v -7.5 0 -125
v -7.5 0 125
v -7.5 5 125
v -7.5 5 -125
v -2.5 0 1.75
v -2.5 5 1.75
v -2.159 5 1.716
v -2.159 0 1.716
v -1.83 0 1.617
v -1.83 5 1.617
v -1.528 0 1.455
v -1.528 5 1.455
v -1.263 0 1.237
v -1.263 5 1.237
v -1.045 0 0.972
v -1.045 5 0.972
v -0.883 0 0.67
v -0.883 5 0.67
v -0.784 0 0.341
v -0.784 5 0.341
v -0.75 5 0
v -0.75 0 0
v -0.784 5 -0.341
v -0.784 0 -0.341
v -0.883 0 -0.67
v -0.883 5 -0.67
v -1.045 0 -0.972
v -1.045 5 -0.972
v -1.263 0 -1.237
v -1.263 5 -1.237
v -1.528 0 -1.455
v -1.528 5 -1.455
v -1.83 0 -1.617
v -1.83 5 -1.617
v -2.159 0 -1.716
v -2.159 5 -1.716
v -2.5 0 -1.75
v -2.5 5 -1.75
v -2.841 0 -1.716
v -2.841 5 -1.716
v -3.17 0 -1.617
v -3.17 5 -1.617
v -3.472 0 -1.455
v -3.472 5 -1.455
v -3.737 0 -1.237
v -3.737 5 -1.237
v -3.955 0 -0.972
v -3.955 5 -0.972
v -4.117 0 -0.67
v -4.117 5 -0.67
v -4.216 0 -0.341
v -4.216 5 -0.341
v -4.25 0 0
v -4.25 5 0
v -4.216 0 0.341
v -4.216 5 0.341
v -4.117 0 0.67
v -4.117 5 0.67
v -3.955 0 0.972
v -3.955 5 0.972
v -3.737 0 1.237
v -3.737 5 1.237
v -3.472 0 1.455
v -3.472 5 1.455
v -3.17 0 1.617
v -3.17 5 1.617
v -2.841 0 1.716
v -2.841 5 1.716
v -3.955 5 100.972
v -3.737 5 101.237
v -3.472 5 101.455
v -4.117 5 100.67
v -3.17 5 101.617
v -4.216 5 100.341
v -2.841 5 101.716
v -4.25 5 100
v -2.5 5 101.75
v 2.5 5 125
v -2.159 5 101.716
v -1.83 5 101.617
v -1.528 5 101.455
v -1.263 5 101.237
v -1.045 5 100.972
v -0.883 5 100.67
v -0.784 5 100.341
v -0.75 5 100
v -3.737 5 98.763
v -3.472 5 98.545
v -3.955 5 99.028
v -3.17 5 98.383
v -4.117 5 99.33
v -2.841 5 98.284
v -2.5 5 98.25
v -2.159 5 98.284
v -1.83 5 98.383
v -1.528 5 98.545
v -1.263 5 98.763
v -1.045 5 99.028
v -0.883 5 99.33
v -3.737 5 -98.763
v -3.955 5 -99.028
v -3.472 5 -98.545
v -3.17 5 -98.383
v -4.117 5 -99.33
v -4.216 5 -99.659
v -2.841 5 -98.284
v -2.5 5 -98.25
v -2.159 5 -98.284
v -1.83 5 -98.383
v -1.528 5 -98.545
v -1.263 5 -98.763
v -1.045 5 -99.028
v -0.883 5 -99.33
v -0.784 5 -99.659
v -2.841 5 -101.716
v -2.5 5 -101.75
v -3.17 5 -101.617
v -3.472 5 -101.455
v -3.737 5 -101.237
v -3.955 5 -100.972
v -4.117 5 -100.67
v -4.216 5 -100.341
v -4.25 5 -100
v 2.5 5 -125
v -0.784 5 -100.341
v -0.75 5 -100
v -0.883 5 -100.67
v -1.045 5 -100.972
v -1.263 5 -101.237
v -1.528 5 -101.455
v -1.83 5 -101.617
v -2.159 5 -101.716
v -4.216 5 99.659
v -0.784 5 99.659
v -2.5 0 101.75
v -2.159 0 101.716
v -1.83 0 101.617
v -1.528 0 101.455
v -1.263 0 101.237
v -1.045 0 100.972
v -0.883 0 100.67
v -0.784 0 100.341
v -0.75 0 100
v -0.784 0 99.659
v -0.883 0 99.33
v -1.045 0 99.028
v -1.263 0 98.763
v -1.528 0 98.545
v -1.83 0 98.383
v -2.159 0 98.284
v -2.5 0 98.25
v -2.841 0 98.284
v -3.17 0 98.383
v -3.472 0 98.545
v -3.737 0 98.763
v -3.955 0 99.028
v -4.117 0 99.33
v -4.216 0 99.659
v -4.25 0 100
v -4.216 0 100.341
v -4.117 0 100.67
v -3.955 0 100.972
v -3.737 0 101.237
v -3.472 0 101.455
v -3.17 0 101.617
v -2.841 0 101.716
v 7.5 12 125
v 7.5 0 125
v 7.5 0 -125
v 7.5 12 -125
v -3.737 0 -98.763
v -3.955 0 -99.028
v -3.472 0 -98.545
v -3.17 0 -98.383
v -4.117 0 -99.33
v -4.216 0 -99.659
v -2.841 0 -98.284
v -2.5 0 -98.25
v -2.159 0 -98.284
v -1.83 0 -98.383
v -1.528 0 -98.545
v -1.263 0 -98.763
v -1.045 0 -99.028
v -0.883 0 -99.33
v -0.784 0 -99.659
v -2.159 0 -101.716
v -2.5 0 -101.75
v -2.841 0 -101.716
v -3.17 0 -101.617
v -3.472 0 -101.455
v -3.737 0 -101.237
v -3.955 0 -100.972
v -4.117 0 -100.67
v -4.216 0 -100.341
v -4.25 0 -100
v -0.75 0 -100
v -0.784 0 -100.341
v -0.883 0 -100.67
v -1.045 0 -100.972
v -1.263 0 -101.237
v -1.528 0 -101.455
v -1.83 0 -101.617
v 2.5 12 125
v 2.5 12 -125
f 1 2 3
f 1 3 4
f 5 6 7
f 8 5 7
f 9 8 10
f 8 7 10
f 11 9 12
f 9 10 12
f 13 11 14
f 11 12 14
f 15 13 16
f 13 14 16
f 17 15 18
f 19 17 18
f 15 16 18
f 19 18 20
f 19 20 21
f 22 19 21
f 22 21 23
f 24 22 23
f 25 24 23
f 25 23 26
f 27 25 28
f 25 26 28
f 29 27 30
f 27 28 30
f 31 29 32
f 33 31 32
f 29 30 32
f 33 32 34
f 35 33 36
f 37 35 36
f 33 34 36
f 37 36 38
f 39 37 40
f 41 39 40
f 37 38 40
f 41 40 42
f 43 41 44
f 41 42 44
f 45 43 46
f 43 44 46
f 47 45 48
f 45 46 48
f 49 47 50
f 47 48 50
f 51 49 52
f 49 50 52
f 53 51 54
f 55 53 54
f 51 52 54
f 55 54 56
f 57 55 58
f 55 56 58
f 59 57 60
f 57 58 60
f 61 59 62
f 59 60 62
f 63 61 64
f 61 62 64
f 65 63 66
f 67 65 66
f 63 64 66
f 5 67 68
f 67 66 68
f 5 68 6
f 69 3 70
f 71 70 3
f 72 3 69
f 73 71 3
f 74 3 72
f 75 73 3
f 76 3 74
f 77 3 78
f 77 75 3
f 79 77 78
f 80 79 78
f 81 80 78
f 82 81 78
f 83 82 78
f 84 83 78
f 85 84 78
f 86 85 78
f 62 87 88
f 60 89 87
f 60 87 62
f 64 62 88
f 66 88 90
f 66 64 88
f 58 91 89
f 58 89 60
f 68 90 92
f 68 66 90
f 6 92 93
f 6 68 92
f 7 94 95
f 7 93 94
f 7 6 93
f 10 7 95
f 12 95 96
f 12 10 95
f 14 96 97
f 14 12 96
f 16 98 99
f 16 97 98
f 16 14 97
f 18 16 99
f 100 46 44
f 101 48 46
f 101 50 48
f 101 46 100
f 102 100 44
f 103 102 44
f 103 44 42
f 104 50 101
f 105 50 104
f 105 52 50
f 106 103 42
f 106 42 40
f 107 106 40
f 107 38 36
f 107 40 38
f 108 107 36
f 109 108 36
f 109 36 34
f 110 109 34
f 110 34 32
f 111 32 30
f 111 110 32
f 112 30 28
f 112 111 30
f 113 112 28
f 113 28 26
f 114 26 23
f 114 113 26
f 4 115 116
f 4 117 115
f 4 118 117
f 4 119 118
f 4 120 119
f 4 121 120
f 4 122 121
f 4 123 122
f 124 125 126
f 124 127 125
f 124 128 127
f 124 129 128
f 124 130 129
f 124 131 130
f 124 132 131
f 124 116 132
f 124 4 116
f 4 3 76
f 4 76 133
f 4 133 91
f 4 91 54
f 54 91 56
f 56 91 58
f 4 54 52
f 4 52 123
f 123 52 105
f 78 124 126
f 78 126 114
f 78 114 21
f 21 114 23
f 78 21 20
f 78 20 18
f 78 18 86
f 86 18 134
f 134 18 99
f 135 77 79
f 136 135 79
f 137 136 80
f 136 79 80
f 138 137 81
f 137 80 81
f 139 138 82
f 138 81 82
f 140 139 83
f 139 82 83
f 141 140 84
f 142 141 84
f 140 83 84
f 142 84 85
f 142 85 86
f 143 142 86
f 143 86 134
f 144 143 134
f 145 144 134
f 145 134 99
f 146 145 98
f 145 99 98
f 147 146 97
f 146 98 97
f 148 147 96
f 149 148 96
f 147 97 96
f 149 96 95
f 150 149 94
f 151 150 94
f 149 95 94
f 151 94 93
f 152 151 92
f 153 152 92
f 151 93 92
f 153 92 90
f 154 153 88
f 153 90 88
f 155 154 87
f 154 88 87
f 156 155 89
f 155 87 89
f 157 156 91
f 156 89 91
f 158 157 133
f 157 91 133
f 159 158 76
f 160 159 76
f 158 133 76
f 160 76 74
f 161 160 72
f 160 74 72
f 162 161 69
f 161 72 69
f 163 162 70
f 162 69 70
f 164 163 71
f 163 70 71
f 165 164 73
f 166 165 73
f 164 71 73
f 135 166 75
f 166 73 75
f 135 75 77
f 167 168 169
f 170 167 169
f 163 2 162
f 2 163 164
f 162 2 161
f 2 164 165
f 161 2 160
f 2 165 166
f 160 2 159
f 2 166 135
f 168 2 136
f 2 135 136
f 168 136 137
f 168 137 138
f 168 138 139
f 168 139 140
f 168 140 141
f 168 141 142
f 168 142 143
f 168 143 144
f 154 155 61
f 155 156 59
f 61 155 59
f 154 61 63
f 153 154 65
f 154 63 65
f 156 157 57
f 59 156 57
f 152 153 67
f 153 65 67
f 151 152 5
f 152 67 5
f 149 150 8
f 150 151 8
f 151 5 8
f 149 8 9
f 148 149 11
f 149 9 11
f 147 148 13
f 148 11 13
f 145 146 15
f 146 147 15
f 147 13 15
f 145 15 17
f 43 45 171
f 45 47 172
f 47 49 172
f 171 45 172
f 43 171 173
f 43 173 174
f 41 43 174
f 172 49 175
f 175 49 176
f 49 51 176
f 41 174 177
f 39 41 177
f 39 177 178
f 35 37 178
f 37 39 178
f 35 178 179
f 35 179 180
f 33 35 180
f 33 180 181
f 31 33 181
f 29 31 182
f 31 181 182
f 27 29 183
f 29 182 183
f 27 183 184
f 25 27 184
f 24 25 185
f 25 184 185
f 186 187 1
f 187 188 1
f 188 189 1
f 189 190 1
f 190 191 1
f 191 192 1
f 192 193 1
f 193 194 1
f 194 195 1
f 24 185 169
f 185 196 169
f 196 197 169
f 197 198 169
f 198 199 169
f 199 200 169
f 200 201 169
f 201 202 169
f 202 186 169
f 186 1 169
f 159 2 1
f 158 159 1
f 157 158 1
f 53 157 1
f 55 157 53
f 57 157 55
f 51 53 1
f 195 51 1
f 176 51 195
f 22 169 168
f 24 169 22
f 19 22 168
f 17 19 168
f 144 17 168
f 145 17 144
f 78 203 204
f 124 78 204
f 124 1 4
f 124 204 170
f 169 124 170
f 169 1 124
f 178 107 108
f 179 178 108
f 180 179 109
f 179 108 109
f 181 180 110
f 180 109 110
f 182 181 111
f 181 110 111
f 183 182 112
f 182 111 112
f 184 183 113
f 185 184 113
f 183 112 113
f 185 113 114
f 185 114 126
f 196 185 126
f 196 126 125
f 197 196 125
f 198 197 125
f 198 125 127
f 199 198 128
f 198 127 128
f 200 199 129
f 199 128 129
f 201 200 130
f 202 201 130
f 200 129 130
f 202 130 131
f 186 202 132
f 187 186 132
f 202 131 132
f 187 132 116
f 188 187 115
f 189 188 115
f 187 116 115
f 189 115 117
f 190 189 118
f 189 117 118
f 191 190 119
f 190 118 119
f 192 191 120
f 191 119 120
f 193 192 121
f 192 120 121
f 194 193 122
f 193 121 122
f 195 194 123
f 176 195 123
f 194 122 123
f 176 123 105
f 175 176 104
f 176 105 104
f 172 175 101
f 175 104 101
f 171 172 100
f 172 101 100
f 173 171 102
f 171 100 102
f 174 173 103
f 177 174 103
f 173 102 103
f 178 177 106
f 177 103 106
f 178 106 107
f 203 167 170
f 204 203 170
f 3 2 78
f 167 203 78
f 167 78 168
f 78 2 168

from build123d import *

# Parameters (mm, degrees)
SKETCH_1_W          = 15
SKETCH_1_H          = 250
EXTRUDE_1_DEPTH     = 5
SKETCH_2_W          = 250
SKETCH_2_H          = 12
EXTRUDE_2_DEPTH     = 5
SKETCH_3_R          = 1.75
CUT_EXTRUDE_1_DEPTH = 5


with BuildPart() as part:
    # 草图1 → 凸台-拉伸1 (new body)
    with BuildSketch(Plane(origin=(0, 0, 0), x_dir=(1, 0, 0), z_dir=(0, 1, 0))):
        Rectangle(SKETCH_1_W, SKETCH_1_H)
    extrude(amount=EXTRUDE_1_DEPTH)

    # 草图2 → 凸台-拉伸2 (add)
    with BuildSketch(Plane(origin=(7.5, 0, 0), x_dir=(0, 0, -1), z_dir=(1, 0, 0))):
        with Locations((0, 6)):
            Rectangle(SKETCH_2_W, SKETCH_2_H)
    extrude(amount=-EXTRUDE_2_DEPTH)

    # 草图3 → 切除-拉伸1 (cut)
    with BuildSketch(Plane(origin=(0, 5, 0), x_dir=(1, 0, 0), z_dir=(0, 1, 0))):
        with Locations(Location((-2.5, 100, 0), (0, 0, 270))):
            Circle(SKETCH_3_R)
        with Locations(Location((-2.5, 0, 0), (0, 0, 270))):
            Circle(SKETCH_3_R)
        with Locations(Location((-2.5, -100, 0), (0, 0, 270))):
            Circle(SKETCH_3_R)
    extrude(amount=-CUT_EXTRUDE_1_DEPTH, mode=Mode.SUBTRACT)


solid = part.part
